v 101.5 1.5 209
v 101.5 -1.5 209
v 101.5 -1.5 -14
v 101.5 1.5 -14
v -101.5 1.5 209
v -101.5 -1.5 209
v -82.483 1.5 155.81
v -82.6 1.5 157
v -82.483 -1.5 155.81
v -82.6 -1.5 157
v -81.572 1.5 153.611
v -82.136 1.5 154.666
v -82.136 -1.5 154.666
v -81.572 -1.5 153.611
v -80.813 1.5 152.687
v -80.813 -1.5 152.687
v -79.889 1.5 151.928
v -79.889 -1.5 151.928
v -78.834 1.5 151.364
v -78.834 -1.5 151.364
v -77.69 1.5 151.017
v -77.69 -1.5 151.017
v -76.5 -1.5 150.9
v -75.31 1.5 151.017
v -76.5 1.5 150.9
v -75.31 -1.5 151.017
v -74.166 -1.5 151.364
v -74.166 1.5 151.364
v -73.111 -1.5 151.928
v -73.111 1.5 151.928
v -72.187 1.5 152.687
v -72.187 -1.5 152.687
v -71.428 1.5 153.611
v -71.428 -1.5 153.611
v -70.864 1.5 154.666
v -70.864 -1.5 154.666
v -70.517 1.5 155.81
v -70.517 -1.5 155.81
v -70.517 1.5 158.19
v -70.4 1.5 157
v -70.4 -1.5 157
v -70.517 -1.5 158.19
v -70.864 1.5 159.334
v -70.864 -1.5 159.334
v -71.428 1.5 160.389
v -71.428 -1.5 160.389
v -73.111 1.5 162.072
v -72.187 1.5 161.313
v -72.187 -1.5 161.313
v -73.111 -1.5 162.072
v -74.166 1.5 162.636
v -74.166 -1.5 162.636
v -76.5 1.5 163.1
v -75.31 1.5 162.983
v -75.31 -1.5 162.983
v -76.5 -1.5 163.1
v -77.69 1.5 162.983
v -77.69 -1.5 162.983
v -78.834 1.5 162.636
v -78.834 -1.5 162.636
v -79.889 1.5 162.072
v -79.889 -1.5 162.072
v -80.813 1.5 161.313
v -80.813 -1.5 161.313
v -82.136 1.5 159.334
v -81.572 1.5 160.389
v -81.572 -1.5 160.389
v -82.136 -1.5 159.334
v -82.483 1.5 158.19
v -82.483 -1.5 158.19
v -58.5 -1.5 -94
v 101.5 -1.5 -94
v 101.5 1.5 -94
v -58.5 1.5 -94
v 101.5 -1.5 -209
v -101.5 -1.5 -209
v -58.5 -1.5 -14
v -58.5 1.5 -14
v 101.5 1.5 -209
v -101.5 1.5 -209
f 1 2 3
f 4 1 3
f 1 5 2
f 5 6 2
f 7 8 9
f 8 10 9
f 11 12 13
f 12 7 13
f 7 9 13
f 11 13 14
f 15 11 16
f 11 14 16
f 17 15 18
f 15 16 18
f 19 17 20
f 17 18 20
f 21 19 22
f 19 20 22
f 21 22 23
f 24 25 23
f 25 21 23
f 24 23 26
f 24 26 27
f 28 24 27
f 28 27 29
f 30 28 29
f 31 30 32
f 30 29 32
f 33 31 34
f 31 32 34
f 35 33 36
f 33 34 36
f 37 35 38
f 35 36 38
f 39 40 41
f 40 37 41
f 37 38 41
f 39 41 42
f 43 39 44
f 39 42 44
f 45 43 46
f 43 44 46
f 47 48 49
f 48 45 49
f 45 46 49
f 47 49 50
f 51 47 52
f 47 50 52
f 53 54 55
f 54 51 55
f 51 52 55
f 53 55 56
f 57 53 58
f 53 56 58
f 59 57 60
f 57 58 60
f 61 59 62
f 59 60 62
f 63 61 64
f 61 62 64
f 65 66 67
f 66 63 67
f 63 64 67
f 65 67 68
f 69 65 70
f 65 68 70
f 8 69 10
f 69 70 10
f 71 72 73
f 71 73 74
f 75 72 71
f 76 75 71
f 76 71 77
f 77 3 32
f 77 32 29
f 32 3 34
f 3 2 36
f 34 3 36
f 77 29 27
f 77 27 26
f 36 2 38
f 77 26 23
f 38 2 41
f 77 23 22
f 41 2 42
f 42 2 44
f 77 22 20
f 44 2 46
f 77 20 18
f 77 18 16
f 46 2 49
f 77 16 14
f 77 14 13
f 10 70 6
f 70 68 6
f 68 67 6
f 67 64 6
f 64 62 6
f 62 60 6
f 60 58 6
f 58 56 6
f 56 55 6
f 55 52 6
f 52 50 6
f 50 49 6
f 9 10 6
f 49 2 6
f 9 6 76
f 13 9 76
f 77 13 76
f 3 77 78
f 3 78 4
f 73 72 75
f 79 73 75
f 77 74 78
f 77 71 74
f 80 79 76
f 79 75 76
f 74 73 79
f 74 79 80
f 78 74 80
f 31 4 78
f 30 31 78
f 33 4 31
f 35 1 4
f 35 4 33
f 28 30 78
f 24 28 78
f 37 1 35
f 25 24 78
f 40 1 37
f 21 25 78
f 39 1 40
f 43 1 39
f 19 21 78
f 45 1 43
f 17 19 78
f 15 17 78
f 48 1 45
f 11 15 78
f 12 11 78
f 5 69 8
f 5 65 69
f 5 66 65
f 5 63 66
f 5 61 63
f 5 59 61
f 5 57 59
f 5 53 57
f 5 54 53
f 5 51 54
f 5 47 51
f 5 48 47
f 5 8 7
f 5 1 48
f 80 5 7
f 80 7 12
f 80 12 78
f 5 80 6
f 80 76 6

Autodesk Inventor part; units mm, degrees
ref_plane "YZ Plane" through (0, 0, 0) normal (1, 0, 0) x (0, 1, 0)
ref_plane "XZ Plane" through (0, 0, 0) normal (0, 1, 0) x (-1, 0, 0)
ref_plane "XY Plane" through (0, 0, 0) normal (0, 0, 1) x (1, 0, 0)
sketch "Szkic1" plane through (0, 0, 0) normal (0, 1, 0) x (-1, 0, 0)
  line L0 (-101.5, -209) -> (101.5, -209)
  line L1 (101.5, -209) -> (101.5, 209)
  line L2 (101.5, 209) -> (-101.5, 209)
  line L3 (-101.5, 209) -> (-101.5, -209)
  line L4 (-101.5, -209) -> (101.5, 209) construction
  line L5 (101.5, -209) -> (-101.5, 209) construction
  line L6 (-101.5, -94) -> (58.5, -94)
  line L7 (58.5, -94) -> (58.5, -14)
  line L8 (58.5, -14) -> (-101.5, -14)
  line L9 (-101.5, -14) -> (-101.5, -94)
  circle A0 centre (76.5, 157) radius 6.1
  point P0 (0, 0)
  dimension "d0" = 203
  dimension "d1" = 418
  dimension "d2" = 160
  dimension "d3" = 80
  dimension "d4" = 115
  dimension "d5" = 12.2
  dimension "d6" = 25
  dimension "d7" = 52
extrude "Wyciągnięcie proste1" add sketch "Szkic1" along normal mid plane 3 contours L3 L6 L7 L8 L2 L1 L0
properties part number "scina_fronotwa"
